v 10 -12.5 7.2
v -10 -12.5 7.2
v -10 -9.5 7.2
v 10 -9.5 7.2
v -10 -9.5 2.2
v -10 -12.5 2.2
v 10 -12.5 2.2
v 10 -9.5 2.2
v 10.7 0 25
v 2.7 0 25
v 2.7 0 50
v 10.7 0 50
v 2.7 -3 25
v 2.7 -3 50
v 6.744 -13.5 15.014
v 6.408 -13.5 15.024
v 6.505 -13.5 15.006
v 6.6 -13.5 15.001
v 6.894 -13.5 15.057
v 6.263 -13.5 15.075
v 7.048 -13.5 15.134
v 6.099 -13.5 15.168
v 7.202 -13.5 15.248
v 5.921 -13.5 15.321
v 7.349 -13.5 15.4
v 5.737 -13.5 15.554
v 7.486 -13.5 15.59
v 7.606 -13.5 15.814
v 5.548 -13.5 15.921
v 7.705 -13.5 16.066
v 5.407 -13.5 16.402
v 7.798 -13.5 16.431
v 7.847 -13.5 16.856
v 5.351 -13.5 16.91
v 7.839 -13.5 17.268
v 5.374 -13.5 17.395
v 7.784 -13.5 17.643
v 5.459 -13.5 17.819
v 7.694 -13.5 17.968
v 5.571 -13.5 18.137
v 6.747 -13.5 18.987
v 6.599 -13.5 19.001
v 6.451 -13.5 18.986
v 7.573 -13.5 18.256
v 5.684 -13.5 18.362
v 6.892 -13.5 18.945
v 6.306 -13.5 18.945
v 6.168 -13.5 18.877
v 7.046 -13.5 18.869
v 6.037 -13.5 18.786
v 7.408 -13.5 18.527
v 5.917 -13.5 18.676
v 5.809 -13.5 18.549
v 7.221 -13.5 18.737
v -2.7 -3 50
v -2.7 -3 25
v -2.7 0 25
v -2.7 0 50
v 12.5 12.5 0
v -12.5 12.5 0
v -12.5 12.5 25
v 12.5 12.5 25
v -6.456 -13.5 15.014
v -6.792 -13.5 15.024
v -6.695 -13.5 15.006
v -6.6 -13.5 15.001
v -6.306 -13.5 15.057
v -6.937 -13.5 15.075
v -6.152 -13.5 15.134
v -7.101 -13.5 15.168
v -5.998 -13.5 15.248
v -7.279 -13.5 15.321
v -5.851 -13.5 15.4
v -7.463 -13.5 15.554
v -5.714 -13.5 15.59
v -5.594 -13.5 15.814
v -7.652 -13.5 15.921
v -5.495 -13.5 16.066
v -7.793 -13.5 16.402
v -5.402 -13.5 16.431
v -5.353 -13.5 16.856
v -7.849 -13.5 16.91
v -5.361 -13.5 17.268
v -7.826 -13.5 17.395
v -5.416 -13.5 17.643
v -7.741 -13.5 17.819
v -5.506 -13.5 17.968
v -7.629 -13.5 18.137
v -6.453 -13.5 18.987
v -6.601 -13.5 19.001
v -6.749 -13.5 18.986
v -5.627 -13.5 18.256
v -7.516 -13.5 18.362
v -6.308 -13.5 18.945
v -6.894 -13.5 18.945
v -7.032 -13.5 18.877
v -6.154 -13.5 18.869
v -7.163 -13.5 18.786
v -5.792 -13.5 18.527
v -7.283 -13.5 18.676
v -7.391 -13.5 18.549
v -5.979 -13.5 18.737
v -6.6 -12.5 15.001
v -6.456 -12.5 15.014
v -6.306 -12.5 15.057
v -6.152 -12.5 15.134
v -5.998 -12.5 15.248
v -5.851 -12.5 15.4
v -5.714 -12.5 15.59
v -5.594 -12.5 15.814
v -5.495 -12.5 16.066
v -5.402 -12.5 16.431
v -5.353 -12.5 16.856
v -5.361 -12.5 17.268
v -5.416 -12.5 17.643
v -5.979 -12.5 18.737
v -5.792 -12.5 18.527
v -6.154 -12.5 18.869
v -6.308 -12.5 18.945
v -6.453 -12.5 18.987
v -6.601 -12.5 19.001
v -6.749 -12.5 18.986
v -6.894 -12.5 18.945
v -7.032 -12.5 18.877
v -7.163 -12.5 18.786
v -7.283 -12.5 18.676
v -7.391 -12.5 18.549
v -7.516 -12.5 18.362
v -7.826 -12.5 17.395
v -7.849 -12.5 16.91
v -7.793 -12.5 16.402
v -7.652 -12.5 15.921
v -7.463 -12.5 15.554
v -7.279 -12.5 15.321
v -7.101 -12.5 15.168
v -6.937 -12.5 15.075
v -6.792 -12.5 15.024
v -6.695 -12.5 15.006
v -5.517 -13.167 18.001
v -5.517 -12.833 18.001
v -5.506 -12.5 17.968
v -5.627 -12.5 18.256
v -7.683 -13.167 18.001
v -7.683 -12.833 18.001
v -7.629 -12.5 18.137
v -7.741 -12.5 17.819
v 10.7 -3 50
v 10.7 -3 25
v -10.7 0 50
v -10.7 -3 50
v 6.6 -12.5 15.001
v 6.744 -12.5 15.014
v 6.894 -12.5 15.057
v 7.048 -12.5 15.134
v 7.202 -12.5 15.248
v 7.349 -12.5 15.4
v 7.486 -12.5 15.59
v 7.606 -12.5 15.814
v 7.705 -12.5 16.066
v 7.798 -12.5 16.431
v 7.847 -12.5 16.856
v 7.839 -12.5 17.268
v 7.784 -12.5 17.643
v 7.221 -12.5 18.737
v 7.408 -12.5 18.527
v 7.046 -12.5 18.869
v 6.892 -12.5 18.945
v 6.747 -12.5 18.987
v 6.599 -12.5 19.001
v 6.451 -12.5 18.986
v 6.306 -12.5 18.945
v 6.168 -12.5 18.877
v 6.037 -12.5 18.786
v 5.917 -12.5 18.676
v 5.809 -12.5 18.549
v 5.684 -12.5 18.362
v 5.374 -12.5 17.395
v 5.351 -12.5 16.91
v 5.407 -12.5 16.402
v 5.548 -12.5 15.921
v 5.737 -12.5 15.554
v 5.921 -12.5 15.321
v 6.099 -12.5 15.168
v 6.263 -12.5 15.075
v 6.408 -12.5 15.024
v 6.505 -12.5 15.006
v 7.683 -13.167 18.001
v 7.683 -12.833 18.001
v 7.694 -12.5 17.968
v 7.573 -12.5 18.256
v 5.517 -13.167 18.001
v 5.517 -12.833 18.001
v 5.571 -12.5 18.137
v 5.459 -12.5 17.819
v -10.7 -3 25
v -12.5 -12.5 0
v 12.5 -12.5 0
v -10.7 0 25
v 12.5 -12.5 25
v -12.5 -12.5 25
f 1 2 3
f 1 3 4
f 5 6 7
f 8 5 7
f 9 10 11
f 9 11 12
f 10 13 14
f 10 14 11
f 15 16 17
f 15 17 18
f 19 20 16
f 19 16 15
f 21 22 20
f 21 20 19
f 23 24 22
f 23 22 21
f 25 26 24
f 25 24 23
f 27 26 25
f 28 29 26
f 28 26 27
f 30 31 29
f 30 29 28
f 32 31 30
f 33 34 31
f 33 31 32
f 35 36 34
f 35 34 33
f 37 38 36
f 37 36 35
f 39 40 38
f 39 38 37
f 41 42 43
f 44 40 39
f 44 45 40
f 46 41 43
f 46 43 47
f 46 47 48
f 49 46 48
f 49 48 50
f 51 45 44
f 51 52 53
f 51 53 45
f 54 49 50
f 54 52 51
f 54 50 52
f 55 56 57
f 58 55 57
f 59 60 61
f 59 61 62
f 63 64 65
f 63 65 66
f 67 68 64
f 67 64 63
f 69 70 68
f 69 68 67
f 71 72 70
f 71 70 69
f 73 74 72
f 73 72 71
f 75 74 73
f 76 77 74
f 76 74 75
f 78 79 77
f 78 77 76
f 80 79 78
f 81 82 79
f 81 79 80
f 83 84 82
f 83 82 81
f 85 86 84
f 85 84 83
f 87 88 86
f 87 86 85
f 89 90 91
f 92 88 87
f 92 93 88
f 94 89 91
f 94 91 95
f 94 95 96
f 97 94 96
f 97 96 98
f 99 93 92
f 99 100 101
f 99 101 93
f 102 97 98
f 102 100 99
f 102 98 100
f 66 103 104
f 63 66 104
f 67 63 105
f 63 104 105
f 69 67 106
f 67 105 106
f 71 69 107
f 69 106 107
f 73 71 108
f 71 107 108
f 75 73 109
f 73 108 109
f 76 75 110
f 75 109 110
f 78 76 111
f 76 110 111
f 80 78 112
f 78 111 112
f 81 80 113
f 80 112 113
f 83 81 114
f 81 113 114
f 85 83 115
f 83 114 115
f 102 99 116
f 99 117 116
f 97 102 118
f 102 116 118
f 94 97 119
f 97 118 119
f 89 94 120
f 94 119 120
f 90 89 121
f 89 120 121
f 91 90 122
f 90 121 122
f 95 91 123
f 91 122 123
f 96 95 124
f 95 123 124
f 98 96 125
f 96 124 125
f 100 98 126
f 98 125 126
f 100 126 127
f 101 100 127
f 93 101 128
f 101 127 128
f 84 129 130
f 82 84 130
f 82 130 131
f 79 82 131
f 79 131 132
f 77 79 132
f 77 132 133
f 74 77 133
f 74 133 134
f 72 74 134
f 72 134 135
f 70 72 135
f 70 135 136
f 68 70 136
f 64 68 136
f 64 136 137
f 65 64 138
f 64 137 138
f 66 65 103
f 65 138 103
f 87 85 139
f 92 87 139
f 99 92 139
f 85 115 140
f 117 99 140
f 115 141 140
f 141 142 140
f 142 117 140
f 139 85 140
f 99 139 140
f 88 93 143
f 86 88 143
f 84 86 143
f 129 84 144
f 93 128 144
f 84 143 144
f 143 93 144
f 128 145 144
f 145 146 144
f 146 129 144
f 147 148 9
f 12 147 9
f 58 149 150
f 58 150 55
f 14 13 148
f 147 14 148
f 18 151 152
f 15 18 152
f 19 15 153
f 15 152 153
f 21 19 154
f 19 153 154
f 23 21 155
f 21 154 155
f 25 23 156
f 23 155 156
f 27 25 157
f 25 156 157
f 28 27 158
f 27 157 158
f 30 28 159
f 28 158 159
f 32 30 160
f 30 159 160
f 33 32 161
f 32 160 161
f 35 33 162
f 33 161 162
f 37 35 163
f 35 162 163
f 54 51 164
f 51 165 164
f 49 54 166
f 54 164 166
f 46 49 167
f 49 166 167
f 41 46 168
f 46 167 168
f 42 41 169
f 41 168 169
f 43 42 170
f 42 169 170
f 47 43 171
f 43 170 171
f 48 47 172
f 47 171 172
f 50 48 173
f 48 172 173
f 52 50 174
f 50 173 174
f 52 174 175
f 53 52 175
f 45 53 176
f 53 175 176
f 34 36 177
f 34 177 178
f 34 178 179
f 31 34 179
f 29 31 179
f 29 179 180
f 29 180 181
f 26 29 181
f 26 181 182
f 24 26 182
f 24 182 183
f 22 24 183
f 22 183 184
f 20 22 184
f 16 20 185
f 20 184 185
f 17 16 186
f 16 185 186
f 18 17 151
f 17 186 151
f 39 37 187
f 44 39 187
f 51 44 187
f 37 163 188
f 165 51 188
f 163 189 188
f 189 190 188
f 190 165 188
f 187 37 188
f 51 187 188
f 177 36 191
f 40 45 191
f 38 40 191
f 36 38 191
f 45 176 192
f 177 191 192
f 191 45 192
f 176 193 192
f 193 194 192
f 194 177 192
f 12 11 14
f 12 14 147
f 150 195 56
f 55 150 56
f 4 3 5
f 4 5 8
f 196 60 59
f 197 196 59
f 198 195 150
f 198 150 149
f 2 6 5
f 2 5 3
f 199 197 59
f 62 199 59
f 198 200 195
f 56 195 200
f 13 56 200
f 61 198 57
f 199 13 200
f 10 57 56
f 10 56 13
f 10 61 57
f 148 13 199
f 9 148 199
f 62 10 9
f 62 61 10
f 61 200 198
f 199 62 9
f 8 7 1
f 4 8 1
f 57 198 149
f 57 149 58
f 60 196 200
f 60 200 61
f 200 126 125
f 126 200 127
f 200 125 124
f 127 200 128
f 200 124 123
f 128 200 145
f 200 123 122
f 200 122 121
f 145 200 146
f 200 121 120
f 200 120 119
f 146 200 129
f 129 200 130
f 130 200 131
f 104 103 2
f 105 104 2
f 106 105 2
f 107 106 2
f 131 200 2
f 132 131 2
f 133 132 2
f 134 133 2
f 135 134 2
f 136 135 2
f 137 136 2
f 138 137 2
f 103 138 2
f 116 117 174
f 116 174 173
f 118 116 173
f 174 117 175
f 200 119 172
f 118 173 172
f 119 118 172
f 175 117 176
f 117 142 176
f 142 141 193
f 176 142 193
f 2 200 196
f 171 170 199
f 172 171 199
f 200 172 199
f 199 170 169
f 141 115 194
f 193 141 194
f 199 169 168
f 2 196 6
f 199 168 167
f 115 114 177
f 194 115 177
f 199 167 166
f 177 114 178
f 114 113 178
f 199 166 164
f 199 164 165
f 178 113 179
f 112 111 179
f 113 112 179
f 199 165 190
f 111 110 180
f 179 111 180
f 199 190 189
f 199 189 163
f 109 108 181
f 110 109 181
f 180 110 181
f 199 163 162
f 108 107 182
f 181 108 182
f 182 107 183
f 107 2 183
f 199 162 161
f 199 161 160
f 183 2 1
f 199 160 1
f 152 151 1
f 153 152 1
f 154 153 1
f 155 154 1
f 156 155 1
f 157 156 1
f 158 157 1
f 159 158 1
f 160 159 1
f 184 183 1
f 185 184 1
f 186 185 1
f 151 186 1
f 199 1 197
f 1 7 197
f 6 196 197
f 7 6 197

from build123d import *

# Parameters (mm, degrees)
F0_W     = 25
F0_H     = 25
F1_DEPTH = 25
F2_W     = 8
F2_H     = 3
F3_DEPTH = 25
F4_W     = 20
F4_H     = 5
F5_DEPTH = 3
F7_DEPTH = 1


with BuildPart() as f1:
    # F0 (on Top) → F1 (new body)
    with BuildSketch(Plane.XY):
        Rectangle(F0_W, F0_H)
    extrude(amount=F1_DEPTH)

    # F2 (on face) → F3 (join)
    with BuildSketch(Plane.XY.offset(25)):
        with Locations((6.7, -1.5)):
            Rectangle(F2_W, F2_H)
        with Locations((-6.7, -1.5)):
            Rectangle(F2_W, F2_H)
    extrude(amount=F3_DEPTH)

    # F4 (on face) → F5 (cut)
    with BuildSketch(Plane.XZ.offset(12.5)):
        with Locations((0, 4.7)):
            Rectangle(F4_W, F4_H)
    extrude(amount=-F5_DEPTH, mode=Mode.SUBTRACT)

    # F6 (on face) → F7 (join)
    with BuildSketch(Plane.XZ.offset(12.5)):
        with BuildLine():
            add(Edge.make_bspline(
                [(-6.6, 15.000625), (-4.434936, 15.000625), (-5.517468, 18.000625), (-6.6, 21.000625), (-7.682532, 18.000625), (-8.765064, 15.000625), (-6.6, 15.000625)],
                knots=[0, 0, 0, 2.094395, 2.094395, 4.18879, 4.18879, 6.283185, 6.283185, 6.283185], degree=2, weights=[1, 0.5, 1, 0.5, 1, 0.5, 1]))
        make_face()
        with BuildLine():
            add(Edge.make_bspline(
                [(6.6, 15.000625), (8.765064, 15.000625), (7.682532, 18.000625), (6.6, 21.000625), (5.517468, 18.000625), (4.434936, 15.000625), (6.6, 15.000625)],
                knots=[0, 0, 0, 2.094395, 2.094395, 4.18879, 4.18879, 6.283185, 6.283185, 6.283185], degree=2, weights=[1, 0.5, 1, 0.5, 1, 0.5, 1]))
        make_face()
    extrude(amount=F7_DEPTH)


solid = f1.part
